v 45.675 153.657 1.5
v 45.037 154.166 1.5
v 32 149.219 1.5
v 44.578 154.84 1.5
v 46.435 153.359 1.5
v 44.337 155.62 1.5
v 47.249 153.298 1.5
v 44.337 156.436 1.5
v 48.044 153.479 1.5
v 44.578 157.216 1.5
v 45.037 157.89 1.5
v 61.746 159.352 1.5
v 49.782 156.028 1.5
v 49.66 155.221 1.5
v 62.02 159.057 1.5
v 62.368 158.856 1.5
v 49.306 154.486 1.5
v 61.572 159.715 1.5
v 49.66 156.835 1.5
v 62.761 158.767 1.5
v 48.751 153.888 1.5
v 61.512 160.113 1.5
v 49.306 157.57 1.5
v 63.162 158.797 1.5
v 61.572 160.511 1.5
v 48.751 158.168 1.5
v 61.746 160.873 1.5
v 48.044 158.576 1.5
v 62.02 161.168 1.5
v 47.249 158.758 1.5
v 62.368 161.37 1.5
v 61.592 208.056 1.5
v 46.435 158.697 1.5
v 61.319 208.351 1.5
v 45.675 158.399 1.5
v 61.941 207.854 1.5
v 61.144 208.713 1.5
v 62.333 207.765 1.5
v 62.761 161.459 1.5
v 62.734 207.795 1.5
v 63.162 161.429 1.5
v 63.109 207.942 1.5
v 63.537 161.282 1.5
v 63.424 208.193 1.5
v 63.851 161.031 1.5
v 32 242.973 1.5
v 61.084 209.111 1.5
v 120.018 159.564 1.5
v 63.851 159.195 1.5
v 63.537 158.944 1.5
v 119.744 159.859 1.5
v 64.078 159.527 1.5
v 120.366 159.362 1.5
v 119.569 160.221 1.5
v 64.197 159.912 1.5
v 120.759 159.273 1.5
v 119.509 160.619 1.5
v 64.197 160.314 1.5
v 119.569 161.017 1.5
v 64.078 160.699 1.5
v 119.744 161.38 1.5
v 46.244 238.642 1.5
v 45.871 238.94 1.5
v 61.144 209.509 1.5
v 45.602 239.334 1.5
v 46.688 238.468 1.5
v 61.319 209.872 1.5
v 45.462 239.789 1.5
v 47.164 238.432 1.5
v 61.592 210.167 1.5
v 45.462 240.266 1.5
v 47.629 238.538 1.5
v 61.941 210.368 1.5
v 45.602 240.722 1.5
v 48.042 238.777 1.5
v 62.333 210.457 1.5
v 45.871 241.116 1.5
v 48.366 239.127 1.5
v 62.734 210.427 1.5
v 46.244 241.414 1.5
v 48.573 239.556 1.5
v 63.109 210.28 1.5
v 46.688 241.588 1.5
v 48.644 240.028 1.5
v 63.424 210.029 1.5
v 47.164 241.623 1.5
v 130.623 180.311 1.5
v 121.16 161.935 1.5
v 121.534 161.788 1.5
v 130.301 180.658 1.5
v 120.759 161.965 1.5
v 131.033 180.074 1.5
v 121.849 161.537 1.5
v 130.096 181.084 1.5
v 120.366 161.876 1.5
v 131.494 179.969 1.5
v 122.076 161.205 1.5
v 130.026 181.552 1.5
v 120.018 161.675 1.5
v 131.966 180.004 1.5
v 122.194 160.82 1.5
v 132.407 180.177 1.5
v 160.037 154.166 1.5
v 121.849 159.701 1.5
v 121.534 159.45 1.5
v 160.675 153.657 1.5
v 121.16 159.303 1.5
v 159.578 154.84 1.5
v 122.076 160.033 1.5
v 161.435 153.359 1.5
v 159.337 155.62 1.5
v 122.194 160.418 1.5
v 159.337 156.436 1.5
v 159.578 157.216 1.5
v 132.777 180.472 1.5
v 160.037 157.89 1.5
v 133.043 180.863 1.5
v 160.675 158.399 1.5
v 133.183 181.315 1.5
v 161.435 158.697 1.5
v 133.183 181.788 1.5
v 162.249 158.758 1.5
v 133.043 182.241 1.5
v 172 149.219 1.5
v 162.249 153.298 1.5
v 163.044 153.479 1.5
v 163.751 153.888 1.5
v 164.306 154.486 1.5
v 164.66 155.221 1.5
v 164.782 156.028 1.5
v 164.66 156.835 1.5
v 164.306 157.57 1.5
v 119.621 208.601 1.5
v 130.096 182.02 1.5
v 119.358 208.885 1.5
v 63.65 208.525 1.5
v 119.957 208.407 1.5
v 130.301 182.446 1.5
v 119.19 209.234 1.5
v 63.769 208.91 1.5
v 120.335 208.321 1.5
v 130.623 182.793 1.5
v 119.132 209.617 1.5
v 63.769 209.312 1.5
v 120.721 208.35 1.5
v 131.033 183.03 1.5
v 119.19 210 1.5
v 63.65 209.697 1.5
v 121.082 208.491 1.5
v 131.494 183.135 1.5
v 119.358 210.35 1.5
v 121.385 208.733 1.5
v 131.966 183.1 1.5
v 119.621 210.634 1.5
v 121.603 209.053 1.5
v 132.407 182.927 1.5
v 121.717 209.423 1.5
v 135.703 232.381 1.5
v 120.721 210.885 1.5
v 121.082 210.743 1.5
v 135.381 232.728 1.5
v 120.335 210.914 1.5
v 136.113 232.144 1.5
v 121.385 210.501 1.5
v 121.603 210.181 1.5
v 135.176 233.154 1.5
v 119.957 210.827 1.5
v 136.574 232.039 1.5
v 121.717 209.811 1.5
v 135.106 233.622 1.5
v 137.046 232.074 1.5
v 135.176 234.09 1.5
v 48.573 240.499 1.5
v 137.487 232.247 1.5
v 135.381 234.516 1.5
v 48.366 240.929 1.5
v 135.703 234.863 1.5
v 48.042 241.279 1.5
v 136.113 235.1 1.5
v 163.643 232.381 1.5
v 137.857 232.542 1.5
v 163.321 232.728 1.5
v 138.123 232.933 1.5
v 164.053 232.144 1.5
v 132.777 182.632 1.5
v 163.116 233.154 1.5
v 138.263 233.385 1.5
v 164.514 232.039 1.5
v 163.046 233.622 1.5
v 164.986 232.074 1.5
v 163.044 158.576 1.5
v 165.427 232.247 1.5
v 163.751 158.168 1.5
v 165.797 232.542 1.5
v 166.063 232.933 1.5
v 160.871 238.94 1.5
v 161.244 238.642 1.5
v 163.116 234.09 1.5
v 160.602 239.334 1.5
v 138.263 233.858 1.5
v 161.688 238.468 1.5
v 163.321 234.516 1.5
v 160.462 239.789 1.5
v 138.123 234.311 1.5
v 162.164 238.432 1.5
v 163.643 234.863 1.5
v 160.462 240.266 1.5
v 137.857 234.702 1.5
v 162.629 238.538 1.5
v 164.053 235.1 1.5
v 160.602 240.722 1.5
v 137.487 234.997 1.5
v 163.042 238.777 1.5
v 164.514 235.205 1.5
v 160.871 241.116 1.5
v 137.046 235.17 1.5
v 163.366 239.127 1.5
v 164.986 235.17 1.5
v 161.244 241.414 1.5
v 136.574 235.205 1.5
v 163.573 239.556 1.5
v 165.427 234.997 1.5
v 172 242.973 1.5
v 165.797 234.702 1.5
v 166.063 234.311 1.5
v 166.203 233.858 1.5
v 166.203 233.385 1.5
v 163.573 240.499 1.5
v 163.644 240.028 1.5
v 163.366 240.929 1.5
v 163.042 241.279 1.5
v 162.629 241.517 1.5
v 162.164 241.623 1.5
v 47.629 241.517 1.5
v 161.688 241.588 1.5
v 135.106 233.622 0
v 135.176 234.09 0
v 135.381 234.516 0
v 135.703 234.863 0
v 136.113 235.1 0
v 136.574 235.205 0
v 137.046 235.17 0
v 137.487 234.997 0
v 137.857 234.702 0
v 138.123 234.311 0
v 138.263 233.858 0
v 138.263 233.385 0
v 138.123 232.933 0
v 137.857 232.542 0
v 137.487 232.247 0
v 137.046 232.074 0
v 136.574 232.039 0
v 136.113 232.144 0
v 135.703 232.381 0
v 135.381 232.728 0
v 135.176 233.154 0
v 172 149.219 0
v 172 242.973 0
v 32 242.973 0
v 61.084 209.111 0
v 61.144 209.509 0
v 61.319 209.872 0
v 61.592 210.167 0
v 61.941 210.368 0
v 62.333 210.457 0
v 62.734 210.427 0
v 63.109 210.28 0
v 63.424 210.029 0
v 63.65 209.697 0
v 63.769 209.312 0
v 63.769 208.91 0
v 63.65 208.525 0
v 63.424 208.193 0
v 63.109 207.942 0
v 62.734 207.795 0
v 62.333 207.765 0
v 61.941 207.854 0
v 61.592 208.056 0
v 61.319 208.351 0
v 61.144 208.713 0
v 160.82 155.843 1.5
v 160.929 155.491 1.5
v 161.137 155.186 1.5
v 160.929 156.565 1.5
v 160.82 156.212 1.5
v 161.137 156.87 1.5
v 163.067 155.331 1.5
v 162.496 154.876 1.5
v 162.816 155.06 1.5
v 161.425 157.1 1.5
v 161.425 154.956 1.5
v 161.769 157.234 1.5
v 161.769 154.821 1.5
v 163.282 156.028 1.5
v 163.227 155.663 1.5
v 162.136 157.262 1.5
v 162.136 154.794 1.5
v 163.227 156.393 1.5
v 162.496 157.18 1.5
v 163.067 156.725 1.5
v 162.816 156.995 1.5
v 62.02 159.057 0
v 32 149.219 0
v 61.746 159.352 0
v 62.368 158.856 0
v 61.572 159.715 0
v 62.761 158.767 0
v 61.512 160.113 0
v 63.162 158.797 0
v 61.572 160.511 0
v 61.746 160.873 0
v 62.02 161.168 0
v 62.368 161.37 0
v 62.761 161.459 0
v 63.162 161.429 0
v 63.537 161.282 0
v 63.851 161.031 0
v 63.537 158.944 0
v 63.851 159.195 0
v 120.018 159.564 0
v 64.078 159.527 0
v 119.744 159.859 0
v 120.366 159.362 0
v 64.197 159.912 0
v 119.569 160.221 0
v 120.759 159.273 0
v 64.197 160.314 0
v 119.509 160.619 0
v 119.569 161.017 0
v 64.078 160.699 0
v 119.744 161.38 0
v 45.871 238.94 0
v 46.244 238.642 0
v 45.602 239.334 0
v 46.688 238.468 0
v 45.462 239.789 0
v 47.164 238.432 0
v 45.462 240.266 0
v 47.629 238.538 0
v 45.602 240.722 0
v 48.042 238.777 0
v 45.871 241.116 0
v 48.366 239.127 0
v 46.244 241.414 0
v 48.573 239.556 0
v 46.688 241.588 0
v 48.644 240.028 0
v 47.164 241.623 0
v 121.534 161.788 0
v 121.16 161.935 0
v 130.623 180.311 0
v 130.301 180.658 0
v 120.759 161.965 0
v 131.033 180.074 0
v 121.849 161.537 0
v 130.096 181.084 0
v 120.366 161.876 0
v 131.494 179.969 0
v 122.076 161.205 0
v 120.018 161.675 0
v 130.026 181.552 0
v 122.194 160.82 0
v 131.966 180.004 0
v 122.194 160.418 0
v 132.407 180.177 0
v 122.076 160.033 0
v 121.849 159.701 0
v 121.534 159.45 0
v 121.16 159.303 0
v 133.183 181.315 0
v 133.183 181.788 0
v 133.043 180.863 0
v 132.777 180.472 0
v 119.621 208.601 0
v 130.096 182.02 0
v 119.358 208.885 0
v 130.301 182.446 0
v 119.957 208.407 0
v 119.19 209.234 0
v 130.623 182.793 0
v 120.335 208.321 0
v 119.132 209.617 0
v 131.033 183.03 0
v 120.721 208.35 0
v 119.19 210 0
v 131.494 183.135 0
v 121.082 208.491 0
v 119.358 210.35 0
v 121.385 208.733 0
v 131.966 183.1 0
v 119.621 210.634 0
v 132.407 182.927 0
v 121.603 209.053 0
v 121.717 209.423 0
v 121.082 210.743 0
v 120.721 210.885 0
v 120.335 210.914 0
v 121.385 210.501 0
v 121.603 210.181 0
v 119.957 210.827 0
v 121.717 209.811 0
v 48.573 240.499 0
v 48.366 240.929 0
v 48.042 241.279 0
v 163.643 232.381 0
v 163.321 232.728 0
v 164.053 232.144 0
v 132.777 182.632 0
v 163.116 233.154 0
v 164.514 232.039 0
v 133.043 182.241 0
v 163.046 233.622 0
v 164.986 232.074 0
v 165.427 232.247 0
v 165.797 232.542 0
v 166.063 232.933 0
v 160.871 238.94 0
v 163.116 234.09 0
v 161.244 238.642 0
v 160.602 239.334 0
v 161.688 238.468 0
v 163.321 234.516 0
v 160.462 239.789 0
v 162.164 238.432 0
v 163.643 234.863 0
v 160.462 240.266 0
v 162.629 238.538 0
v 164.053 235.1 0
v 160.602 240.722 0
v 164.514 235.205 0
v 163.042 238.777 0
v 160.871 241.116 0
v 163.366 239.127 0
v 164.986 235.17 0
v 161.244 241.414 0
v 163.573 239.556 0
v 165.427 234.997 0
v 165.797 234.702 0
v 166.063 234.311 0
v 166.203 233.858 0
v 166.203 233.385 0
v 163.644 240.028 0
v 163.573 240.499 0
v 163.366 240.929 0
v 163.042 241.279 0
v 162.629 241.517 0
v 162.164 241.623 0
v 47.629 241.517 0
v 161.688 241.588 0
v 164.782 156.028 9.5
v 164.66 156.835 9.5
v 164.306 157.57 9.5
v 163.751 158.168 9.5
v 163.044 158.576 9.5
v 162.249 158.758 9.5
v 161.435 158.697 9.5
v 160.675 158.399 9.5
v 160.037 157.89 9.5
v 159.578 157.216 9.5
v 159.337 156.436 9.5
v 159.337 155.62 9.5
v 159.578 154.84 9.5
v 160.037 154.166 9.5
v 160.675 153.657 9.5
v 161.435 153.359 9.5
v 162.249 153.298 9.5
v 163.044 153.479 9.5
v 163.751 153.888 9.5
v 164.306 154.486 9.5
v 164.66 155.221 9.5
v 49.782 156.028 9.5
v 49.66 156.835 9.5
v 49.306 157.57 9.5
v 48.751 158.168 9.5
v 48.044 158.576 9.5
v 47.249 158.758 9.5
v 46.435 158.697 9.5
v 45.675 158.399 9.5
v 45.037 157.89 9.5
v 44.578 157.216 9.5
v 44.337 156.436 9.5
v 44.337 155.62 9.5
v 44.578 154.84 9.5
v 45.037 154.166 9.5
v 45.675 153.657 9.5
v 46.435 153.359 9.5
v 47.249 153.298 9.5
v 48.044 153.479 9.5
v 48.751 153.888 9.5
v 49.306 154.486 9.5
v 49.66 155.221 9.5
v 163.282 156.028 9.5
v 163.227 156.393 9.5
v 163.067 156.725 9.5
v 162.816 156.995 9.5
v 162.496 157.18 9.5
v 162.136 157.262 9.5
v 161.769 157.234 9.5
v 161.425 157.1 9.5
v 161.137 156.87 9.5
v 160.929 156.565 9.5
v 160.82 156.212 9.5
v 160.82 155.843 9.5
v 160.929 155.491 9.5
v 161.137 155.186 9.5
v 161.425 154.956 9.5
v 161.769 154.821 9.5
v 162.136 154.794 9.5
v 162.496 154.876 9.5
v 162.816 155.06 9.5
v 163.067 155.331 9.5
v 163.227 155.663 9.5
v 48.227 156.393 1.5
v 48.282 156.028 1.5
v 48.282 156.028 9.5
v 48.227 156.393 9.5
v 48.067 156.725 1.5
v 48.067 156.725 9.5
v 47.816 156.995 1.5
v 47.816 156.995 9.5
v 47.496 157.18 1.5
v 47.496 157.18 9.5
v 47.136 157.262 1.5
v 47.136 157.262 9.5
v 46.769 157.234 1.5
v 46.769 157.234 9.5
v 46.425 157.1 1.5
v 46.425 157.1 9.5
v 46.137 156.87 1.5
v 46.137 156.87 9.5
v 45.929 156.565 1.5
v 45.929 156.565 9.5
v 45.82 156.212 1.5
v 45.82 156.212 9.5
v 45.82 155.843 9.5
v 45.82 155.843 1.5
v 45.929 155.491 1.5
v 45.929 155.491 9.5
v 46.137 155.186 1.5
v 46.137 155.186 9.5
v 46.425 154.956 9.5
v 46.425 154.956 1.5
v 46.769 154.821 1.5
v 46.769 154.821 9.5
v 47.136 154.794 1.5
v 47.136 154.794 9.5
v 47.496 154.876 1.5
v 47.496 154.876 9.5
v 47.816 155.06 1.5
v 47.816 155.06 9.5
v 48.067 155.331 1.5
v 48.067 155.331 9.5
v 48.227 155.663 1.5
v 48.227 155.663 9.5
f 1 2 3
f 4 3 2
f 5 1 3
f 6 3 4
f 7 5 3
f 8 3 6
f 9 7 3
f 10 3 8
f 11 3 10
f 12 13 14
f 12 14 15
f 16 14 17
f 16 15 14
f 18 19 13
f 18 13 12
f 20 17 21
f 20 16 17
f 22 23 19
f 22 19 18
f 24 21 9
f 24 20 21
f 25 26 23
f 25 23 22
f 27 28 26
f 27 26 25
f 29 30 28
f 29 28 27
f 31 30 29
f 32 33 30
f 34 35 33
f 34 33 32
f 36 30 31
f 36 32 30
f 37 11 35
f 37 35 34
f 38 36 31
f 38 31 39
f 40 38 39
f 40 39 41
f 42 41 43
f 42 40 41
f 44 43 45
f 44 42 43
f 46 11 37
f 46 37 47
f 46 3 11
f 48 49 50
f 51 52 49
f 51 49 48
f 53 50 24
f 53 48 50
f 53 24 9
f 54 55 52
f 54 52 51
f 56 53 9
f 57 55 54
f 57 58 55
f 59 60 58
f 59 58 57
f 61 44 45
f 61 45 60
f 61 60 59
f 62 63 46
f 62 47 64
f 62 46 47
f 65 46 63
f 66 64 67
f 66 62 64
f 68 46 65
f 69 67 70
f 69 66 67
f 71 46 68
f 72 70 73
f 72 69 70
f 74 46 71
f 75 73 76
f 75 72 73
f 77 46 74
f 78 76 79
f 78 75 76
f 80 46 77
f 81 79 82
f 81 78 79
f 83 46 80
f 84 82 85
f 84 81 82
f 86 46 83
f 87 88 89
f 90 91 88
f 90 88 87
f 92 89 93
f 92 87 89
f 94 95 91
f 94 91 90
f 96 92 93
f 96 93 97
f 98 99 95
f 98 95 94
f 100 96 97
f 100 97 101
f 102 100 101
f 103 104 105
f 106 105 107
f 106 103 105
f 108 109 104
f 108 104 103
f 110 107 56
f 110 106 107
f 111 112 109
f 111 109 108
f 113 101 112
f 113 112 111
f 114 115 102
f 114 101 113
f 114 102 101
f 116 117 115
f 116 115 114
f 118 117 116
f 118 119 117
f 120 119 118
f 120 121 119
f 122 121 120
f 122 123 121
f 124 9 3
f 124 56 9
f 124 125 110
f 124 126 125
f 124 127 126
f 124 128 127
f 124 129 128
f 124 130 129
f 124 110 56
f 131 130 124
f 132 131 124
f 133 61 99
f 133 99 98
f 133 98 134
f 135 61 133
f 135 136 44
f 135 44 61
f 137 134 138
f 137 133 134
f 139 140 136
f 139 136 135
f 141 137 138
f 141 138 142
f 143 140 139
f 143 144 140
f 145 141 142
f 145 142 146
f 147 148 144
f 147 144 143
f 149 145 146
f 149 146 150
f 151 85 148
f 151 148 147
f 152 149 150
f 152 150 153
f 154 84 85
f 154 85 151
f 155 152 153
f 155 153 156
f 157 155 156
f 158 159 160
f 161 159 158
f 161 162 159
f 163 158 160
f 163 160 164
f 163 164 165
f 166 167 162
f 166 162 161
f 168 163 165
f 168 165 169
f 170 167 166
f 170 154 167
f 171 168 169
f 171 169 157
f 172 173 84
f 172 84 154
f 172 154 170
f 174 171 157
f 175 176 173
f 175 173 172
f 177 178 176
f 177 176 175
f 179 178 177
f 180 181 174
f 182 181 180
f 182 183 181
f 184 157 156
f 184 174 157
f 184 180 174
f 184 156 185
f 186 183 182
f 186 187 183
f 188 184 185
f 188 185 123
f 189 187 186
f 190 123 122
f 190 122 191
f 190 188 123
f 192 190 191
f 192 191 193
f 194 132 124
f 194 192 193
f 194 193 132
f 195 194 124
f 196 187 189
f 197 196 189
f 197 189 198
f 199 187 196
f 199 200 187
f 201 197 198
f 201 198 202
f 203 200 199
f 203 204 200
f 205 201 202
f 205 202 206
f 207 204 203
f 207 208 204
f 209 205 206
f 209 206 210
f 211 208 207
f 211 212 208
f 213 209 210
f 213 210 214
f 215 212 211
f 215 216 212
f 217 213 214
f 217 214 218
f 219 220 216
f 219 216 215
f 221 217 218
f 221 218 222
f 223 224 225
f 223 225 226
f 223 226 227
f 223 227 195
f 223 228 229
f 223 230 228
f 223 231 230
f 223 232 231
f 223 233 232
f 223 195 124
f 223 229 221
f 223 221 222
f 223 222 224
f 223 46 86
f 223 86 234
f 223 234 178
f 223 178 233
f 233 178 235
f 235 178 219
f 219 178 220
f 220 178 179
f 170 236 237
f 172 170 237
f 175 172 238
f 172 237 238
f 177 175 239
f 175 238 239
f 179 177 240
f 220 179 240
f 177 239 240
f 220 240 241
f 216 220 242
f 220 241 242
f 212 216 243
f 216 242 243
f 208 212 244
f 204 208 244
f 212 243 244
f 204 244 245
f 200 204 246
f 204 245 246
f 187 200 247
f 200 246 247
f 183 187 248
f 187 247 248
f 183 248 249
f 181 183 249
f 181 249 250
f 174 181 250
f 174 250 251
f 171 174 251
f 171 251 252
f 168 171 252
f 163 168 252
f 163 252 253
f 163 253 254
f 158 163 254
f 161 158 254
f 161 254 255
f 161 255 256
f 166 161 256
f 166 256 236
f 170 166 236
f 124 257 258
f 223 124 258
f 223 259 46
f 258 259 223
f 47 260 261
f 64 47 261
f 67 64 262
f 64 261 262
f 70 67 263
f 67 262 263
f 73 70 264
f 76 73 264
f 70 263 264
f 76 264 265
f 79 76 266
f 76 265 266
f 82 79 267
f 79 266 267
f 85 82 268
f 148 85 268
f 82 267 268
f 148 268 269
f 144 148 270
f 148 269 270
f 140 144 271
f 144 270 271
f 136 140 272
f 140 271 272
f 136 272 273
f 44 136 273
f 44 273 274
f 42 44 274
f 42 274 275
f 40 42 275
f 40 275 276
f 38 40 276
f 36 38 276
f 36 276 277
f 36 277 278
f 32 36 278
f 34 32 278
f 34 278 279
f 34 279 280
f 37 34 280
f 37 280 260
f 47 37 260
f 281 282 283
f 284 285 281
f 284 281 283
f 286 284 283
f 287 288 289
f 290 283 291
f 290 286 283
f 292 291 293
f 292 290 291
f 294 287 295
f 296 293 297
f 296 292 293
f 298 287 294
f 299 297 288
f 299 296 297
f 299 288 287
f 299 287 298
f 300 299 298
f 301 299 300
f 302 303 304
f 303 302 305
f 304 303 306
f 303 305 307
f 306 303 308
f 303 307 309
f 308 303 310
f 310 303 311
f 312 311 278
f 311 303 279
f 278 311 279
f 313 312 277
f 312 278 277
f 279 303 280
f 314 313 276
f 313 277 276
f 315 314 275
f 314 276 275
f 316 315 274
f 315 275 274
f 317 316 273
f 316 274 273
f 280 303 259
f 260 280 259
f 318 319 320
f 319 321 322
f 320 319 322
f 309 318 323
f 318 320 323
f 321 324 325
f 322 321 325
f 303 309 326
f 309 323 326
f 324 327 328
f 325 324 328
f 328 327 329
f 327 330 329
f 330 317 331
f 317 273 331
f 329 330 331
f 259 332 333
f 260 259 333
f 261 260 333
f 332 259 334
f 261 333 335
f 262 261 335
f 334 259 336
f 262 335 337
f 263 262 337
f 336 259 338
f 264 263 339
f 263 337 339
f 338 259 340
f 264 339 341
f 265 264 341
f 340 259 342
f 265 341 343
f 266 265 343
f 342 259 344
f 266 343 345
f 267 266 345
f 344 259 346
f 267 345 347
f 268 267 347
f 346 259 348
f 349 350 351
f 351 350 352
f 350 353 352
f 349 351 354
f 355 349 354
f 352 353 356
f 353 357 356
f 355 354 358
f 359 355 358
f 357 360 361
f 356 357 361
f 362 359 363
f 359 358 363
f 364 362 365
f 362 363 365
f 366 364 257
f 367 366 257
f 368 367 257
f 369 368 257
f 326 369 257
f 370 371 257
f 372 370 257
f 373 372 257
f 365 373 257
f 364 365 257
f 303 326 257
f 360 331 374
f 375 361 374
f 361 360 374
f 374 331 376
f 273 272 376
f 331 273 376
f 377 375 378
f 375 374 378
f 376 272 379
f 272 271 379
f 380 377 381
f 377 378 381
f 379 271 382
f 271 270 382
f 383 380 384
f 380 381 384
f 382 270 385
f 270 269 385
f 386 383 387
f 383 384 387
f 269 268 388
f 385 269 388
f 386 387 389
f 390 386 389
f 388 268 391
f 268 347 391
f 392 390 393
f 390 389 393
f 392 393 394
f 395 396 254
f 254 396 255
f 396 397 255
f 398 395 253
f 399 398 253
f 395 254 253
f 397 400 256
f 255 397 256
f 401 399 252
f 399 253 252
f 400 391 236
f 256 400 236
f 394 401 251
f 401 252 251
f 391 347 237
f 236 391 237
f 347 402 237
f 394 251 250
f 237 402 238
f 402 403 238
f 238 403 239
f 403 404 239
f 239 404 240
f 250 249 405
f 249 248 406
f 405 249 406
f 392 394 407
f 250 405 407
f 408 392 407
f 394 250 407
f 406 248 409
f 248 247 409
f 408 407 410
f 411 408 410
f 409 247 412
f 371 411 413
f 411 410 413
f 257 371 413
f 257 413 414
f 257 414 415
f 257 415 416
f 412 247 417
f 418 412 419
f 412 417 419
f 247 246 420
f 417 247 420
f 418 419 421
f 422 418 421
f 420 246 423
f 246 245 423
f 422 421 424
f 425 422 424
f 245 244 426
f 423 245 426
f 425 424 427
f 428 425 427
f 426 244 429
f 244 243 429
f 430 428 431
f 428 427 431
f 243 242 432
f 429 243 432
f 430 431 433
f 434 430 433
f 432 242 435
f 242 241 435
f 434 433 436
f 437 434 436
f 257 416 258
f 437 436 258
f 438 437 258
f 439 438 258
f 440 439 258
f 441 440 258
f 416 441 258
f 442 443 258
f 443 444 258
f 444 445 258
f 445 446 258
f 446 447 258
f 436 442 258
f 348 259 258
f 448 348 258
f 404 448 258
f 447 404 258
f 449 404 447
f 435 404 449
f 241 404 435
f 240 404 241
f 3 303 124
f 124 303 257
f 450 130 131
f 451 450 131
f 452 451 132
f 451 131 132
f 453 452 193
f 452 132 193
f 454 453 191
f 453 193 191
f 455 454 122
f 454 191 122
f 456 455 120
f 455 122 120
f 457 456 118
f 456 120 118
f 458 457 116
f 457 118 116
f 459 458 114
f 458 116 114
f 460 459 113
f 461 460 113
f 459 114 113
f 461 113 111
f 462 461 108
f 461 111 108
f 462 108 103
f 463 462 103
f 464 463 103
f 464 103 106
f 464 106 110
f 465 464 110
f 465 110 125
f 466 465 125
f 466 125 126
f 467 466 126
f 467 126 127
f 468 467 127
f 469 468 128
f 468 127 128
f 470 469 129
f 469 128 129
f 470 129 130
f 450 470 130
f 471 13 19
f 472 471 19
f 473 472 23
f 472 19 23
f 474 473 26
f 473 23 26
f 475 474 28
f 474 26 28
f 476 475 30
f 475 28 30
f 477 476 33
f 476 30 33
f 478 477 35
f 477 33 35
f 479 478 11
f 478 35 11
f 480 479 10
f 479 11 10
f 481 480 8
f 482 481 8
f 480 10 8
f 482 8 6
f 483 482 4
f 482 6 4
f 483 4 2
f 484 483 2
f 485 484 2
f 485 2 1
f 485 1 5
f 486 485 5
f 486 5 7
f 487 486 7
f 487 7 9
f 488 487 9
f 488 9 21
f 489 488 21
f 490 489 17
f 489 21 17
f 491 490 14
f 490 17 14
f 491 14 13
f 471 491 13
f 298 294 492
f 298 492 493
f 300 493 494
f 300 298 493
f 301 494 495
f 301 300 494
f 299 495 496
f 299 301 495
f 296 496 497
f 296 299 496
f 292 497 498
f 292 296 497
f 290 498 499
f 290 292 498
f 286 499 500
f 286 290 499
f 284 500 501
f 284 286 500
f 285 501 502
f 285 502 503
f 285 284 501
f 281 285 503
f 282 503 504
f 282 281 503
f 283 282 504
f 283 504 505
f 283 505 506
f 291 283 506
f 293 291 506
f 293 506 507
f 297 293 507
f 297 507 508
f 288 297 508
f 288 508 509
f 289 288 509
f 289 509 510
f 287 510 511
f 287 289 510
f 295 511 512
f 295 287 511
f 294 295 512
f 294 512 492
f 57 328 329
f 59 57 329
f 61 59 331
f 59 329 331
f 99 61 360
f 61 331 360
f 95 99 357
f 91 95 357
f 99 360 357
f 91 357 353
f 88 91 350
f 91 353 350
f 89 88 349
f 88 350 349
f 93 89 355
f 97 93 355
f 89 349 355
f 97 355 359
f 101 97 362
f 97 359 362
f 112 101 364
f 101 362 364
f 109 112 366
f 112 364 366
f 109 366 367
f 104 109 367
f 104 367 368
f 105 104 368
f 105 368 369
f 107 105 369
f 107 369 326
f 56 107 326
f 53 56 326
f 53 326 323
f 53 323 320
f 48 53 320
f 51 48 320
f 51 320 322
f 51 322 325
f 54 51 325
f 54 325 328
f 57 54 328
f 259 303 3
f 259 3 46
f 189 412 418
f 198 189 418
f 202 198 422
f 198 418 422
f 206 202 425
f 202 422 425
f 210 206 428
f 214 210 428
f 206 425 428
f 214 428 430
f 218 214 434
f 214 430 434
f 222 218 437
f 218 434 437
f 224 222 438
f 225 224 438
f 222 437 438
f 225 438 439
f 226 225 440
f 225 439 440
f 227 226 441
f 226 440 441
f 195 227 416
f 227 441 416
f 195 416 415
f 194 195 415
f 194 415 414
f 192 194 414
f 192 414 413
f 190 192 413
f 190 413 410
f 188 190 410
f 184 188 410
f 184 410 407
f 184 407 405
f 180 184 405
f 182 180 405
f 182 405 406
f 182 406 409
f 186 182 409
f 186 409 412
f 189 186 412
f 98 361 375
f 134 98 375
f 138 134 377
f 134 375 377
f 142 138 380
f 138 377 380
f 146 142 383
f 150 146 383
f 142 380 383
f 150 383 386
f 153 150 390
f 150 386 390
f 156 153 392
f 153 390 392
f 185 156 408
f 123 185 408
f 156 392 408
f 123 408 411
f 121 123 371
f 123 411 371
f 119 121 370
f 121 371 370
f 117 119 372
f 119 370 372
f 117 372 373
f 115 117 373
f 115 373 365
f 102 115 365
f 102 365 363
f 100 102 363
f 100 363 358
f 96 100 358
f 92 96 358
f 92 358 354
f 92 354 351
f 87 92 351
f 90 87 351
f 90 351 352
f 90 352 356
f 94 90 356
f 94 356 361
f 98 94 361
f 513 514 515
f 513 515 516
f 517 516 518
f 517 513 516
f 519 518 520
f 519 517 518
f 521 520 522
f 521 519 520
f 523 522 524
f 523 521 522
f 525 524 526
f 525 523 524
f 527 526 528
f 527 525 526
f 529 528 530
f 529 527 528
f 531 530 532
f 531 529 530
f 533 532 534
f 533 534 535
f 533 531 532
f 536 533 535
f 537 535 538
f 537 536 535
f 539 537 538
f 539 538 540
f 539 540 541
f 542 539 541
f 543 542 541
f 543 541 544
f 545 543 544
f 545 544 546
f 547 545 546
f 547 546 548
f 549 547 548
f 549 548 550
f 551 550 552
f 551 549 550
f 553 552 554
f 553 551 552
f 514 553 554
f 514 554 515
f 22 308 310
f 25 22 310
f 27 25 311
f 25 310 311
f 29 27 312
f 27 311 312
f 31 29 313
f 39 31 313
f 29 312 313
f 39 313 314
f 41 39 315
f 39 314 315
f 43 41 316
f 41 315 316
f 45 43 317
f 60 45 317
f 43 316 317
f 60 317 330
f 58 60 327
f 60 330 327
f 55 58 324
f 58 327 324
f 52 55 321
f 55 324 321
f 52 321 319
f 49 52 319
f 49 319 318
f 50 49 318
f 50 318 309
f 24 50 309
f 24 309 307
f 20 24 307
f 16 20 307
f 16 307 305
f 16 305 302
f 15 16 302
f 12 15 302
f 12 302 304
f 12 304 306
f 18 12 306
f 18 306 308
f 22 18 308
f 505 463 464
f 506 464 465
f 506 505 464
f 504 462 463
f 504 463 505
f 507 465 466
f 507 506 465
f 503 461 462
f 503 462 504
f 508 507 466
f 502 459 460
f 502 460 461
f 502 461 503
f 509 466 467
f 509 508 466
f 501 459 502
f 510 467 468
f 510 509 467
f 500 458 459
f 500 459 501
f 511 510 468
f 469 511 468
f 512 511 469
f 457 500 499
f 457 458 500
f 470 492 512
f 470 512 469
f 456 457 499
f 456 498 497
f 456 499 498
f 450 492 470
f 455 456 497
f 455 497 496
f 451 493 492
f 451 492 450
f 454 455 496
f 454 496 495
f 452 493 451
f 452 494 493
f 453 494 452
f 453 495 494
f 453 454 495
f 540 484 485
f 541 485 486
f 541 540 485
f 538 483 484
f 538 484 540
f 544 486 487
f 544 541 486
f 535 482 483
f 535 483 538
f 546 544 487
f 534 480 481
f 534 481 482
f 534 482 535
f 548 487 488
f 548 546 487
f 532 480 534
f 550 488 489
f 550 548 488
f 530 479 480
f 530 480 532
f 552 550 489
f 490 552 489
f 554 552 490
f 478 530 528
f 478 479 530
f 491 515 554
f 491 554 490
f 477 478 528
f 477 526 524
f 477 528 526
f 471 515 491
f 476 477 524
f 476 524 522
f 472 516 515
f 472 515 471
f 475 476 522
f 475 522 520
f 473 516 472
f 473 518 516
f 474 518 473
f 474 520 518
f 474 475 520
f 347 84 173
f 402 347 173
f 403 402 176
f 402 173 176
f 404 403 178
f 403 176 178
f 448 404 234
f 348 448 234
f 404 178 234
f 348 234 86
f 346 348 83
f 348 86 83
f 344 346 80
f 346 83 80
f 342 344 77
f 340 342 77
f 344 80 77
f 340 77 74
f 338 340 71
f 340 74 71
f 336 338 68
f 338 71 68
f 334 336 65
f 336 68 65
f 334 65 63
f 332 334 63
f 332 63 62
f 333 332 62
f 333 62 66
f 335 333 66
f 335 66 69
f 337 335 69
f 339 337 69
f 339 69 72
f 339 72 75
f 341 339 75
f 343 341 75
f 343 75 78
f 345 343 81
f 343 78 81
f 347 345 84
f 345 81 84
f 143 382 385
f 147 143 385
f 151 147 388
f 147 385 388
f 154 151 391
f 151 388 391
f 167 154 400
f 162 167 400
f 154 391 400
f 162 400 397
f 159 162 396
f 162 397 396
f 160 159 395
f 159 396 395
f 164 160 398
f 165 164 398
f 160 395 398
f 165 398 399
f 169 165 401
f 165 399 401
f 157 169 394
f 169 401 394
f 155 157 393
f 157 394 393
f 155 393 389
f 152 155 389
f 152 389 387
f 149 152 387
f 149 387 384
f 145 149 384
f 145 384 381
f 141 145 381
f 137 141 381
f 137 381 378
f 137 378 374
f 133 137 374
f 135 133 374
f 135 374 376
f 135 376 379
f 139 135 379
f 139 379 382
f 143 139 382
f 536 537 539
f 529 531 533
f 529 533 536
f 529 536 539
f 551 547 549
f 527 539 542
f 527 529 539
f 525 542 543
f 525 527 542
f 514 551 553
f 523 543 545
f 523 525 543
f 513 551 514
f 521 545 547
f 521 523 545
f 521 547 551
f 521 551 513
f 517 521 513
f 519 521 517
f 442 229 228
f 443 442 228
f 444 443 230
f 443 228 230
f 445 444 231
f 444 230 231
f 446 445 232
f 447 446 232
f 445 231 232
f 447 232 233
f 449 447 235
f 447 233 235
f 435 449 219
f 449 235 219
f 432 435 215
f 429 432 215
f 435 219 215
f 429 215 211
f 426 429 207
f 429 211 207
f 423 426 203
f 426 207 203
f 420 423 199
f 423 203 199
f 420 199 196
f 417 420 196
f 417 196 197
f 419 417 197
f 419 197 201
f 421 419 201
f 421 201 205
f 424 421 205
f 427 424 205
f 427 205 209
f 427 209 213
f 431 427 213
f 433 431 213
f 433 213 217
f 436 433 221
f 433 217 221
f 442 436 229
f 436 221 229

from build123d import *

# Parameters (mm, degrees)
SKETCH1_W           = 140
SKETCH1_H           = 93.753760253
BOSS_EXTRUDE1_DEPTH = 1.5
SKETCH2_R           = 1.6
CUT_EXTRUDE1_DEPTH  = 1.5
SKETCH3_R           = 2.737611944
SKETCH3_R_2         = 1.237611944
BOSS_EXTRUDE2_DEPTH = 8
SKETCH4_R           = 1.3
SKETCH4_R_2         = 1.35
SKETCH4_R_3         = 1.5875
CUT_EXTRUDE2_DEPTH  = 8


with BuildPart() as part:
    # Sketch1 → Boss-Extrude1 (new body)
    with BuildSketch(Plane.XY):
        with Locations((102, 196.095777869)):
            Rectangle(SKETCH1_W, SKETCH1_H)
    extrude(amount=BOSS_EXTRUDE1_DEPTH)

    # Sketch2 → Cut-Extrude1 (cut)
    with BuildSketch(Plane.XY.offset(1.5)):
        with Locations((47.04400772, 240.027868216)):
            Circle(SKETCH2_R)
        with Locations((162.04400772, 240.027868216)):
            Circle(SKETCH2_R)
    extrude(amount=-CUT_EXTRUDE1_DEPTH, mode=Mode.SUBTRACT)

    # Sketch3 → Boss-Extrude2 (add)
    # profile 1 of 2: a face of its own
    with BuildSketch(Plane.XY.offset(1.5)):
        with Locations((47.04400772, 156.027868216)):
            Circle(SKETCH3_R)
        with Locations((47.04400772, 156.027868216)):
            Circle(SKETCH3_R_2, mode=Mode.SUBTRACT)
    # profile 2 of 2: a face of its own
    with BuildSketch(Plane.XY.offset(1.5)):
        with Locations((162.04400772, 156.027868216)):
            Circle(SKETCH3_R)
        with Locations((162.04400772, 156.027868216)):
            Circle(SKETCH3_R_2, mode=Mode.SUBTRACT)
    extrude(amount=BOSS_EXTRUDE2_DEPTH)

    # Sketch4 → Cut-Extrude2 (cut)
    with BuildSketch(Plane(origin=(0, 0, 0), x_dir=(-1, 0, 0), z_dir=(0, 0, -1))):
        with Locations((-120.431826709, 209.617216317)):
            Circle(SKETCH4_R)
        with Locations((-62.434035172, 209.111077258)):
            Circle(SKETCH4_R_2)
        with Locations((-62.861635411, 160.112943028)):
            Circle(SKETCH4_R_2)
        with Locations((-120.859426949, 160.619082087)):
            Circle(SKETCH4_R_2)
        with Locations((-131.613133958, 181.551872542)):
            Circle(SKETCH4_R_3)
        with Locations((-136.693133958, 233.621872542)):
            Circle(SKETCH4_R_3)
        with Locations((-164.633133958, 233.621872542)):
            Circle(SKETCH4_R_3)
    extrude(amount=-CUT_EXTRUDE2_DEPTH, mode=Mode.SUBTRACT)


solid = part.part
